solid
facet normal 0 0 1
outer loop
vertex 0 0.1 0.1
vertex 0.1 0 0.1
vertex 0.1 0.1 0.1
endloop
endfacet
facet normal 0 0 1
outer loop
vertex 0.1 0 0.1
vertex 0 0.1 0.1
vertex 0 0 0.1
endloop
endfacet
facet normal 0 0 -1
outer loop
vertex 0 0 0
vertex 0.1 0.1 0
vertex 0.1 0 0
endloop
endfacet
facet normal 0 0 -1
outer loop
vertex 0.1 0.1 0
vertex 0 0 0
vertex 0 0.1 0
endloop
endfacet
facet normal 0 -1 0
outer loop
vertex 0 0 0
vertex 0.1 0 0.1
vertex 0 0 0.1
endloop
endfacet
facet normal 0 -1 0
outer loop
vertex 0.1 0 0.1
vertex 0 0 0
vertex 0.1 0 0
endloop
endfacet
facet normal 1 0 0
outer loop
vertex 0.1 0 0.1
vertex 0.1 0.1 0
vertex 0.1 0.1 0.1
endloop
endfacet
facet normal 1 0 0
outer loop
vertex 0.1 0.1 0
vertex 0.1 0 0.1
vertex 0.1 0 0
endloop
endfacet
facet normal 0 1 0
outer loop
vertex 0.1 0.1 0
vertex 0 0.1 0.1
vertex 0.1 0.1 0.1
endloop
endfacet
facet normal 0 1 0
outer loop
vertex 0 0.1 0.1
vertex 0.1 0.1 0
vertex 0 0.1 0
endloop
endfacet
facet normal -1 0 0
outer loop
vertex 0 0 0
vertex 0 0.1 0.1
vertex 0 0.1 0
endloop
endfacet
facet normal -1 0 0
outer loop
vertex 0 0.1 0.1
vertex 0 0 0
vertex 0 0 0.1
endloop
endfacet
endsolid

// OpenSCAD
// SPDX-License-Identifier: MIT
// ----------------------------------------------------------------------------
// tq_threads_selftest.scad  --  STANDARD-TABLE self-test (parse/render time).
//
// Pure assertions (no heavy geometry): verifies the preset table integrity,
// preset-count floor, spot-check nominal values, and the ISO 965 fundamental-
// deviation formulae.  Renders only a trivial cube so `openscad -o out.stl`
// exits 0 on success and NONZERO on any failed assertion.
//
//   openscad -o selftest.stl tq_threads_selftest.scad
// ----------------------------------------------------------------------------

include <tq_threads.scad>

// -- preset table integrity --------------------------------------------------
assert(tq_presets_selfcheck(),
       "SELFTEST: preset table self-check failed (a row is malformed or unresolvable)");
assert(tq_preset_count() >= 101,
       str("SELFTEST: preset count regressed below 101 (v0.4 baseline): ", tq_preset_count()));

// -- spot-check nominal preset values (exact) --------------------------------
assert(tq_preset("M3")  == [3.0, 0.50],  "SELFTEST: M3 nominal");
assert(tq_preset("M8")  == [8.0, 1.25],  "SELFTEST: M8 nominal");
assert(tq_preset("M12") == [12.0, 1.75], "SELFTEST: M12 nominal");
assert(tq_preset("M10x1.25") == [10.0, 1.25], "SELFTEST: M10x1.25 fine");
assert(abs(tq_preset("1/4-20")[0] - 6.35) < 1e-9,       "SELFTEST: 1/4-20 major");
assert(abs(tq_preset("1/4-20")[1] - 25.4/20) < 1e-12,   "SELFTEST: 1/4-20 pitch");
assert(abs(tq_preset("#6-32")[0]  - 0.138*25.4) < 1e-9, "SELFTEST: #6-32 major");
assert(abs(tq_preset("#10-32")[1] - 25.4/32) < 1e-12,   "SELFTEST: #10-32 pitch");
assert(is_undef(tq_preset("NoSuchPreset")),             "SELFTEST: unknown -> undef");

// -- ISO 965-1 fundamental deviation formulae (exact, micrometres) -----------
assert(abs(_tq_fit_dev_mm("g", 1.25)*1000 - (-(15 + 11*1.25))) < 1e-9, "SELFTEST: es(g)");
assert(abs(_tq_fit_dev_mm("f", 1.0 )*1000 - (-(30 + 11*1.0 ))) < 1e-9, "SELFTEST: es(f)");
assert(abs(_tq_fit_dev_mm("e", 1.0 )*1000 - (-(50 + 11*1.0 ))) < 1e-9, "SELFTEST: es(e)");
assert(_tq_fit_dev_mm("h", 1.0) == 0,                                  "SELFTEST: es(h)=0");
assert(abs(_tq_fit_dev_mm("G", 1.5)*1000 - ( 15 + 11*1.5)) < 1e-9,     "SELFTEST: EI(G)");
assert(_tq_fit_dev_mm("H", 1.0) == 0,                                  "SELFTEST: EI(H)=0");

// -- v0.6 profile-control geometry -----------------------------------------
P2 = 2;
S1 = 1;
assert(abs(_tq_profile_height(P2, P2, 0, 0, "sharp", false, 1, 30) - _TQ_H * P2) < 1e-6,
       "SELFTEST: sharp profile is a full 60-degree V by default");
assert(abs(_tq_profile_height(4, S1, 0, 0, "sharp", false, 1, 30) - (_TQ_H * S1)) < 1e-6,
       "SELFTEST: side_angle=30 maps thread_size to a 60-degree V");
assert(abs(_tq_profile_height(4, 3, 0, 0, "rectangle", true, 1/3, 30) - 1) < 1e-9,
       "SELFTEST: rectangle rect_ratio controls depth");
assert(abs(tq_npt_taper_rate() - 1/16) < 1e-12,
       "SELFTEST: NPT reference taper rate");
rect_tbl = _tq_table_rect(4, 2, 4, 5);
groove_tbl = _tq_table_groove(rect_tbl, 4, 5);
assert(abs(lookup(2, rect_tbl) - 5) < 1e-9 && abs(lookup(2, groove_tbl) - 4) < 1e-9,
       "SELFTEST: groove profile inverts the tooth into the base cylinder");
assert(_tq_lead_start("start", false) && !_tq_lead_end("start", true),
       "SELFTEST: lead_ends=start selects only the start");
assert(!_tq_lead_start("end", true) && _tq_lead_end("end", false),
       "SELFTEST: lead_ends=end selects only the end");
assert(_tq_lead_start("both", false) && _tq_lead_end("both", false),
       "SELFTEST: lead_ends=both selects both ends");
assert(!_tq_lead_start("none", true) && !_tq_lead_end("none", true),
       "SELFTEST: lead_ends=none disables both ends");

echo(str("SELFTEST PASS: ", tq_preset_count(), " presets, table + ISO 965 + profile-control formulae OK"));
cube(0.1);   // trivial geometry so STL export succeeds
